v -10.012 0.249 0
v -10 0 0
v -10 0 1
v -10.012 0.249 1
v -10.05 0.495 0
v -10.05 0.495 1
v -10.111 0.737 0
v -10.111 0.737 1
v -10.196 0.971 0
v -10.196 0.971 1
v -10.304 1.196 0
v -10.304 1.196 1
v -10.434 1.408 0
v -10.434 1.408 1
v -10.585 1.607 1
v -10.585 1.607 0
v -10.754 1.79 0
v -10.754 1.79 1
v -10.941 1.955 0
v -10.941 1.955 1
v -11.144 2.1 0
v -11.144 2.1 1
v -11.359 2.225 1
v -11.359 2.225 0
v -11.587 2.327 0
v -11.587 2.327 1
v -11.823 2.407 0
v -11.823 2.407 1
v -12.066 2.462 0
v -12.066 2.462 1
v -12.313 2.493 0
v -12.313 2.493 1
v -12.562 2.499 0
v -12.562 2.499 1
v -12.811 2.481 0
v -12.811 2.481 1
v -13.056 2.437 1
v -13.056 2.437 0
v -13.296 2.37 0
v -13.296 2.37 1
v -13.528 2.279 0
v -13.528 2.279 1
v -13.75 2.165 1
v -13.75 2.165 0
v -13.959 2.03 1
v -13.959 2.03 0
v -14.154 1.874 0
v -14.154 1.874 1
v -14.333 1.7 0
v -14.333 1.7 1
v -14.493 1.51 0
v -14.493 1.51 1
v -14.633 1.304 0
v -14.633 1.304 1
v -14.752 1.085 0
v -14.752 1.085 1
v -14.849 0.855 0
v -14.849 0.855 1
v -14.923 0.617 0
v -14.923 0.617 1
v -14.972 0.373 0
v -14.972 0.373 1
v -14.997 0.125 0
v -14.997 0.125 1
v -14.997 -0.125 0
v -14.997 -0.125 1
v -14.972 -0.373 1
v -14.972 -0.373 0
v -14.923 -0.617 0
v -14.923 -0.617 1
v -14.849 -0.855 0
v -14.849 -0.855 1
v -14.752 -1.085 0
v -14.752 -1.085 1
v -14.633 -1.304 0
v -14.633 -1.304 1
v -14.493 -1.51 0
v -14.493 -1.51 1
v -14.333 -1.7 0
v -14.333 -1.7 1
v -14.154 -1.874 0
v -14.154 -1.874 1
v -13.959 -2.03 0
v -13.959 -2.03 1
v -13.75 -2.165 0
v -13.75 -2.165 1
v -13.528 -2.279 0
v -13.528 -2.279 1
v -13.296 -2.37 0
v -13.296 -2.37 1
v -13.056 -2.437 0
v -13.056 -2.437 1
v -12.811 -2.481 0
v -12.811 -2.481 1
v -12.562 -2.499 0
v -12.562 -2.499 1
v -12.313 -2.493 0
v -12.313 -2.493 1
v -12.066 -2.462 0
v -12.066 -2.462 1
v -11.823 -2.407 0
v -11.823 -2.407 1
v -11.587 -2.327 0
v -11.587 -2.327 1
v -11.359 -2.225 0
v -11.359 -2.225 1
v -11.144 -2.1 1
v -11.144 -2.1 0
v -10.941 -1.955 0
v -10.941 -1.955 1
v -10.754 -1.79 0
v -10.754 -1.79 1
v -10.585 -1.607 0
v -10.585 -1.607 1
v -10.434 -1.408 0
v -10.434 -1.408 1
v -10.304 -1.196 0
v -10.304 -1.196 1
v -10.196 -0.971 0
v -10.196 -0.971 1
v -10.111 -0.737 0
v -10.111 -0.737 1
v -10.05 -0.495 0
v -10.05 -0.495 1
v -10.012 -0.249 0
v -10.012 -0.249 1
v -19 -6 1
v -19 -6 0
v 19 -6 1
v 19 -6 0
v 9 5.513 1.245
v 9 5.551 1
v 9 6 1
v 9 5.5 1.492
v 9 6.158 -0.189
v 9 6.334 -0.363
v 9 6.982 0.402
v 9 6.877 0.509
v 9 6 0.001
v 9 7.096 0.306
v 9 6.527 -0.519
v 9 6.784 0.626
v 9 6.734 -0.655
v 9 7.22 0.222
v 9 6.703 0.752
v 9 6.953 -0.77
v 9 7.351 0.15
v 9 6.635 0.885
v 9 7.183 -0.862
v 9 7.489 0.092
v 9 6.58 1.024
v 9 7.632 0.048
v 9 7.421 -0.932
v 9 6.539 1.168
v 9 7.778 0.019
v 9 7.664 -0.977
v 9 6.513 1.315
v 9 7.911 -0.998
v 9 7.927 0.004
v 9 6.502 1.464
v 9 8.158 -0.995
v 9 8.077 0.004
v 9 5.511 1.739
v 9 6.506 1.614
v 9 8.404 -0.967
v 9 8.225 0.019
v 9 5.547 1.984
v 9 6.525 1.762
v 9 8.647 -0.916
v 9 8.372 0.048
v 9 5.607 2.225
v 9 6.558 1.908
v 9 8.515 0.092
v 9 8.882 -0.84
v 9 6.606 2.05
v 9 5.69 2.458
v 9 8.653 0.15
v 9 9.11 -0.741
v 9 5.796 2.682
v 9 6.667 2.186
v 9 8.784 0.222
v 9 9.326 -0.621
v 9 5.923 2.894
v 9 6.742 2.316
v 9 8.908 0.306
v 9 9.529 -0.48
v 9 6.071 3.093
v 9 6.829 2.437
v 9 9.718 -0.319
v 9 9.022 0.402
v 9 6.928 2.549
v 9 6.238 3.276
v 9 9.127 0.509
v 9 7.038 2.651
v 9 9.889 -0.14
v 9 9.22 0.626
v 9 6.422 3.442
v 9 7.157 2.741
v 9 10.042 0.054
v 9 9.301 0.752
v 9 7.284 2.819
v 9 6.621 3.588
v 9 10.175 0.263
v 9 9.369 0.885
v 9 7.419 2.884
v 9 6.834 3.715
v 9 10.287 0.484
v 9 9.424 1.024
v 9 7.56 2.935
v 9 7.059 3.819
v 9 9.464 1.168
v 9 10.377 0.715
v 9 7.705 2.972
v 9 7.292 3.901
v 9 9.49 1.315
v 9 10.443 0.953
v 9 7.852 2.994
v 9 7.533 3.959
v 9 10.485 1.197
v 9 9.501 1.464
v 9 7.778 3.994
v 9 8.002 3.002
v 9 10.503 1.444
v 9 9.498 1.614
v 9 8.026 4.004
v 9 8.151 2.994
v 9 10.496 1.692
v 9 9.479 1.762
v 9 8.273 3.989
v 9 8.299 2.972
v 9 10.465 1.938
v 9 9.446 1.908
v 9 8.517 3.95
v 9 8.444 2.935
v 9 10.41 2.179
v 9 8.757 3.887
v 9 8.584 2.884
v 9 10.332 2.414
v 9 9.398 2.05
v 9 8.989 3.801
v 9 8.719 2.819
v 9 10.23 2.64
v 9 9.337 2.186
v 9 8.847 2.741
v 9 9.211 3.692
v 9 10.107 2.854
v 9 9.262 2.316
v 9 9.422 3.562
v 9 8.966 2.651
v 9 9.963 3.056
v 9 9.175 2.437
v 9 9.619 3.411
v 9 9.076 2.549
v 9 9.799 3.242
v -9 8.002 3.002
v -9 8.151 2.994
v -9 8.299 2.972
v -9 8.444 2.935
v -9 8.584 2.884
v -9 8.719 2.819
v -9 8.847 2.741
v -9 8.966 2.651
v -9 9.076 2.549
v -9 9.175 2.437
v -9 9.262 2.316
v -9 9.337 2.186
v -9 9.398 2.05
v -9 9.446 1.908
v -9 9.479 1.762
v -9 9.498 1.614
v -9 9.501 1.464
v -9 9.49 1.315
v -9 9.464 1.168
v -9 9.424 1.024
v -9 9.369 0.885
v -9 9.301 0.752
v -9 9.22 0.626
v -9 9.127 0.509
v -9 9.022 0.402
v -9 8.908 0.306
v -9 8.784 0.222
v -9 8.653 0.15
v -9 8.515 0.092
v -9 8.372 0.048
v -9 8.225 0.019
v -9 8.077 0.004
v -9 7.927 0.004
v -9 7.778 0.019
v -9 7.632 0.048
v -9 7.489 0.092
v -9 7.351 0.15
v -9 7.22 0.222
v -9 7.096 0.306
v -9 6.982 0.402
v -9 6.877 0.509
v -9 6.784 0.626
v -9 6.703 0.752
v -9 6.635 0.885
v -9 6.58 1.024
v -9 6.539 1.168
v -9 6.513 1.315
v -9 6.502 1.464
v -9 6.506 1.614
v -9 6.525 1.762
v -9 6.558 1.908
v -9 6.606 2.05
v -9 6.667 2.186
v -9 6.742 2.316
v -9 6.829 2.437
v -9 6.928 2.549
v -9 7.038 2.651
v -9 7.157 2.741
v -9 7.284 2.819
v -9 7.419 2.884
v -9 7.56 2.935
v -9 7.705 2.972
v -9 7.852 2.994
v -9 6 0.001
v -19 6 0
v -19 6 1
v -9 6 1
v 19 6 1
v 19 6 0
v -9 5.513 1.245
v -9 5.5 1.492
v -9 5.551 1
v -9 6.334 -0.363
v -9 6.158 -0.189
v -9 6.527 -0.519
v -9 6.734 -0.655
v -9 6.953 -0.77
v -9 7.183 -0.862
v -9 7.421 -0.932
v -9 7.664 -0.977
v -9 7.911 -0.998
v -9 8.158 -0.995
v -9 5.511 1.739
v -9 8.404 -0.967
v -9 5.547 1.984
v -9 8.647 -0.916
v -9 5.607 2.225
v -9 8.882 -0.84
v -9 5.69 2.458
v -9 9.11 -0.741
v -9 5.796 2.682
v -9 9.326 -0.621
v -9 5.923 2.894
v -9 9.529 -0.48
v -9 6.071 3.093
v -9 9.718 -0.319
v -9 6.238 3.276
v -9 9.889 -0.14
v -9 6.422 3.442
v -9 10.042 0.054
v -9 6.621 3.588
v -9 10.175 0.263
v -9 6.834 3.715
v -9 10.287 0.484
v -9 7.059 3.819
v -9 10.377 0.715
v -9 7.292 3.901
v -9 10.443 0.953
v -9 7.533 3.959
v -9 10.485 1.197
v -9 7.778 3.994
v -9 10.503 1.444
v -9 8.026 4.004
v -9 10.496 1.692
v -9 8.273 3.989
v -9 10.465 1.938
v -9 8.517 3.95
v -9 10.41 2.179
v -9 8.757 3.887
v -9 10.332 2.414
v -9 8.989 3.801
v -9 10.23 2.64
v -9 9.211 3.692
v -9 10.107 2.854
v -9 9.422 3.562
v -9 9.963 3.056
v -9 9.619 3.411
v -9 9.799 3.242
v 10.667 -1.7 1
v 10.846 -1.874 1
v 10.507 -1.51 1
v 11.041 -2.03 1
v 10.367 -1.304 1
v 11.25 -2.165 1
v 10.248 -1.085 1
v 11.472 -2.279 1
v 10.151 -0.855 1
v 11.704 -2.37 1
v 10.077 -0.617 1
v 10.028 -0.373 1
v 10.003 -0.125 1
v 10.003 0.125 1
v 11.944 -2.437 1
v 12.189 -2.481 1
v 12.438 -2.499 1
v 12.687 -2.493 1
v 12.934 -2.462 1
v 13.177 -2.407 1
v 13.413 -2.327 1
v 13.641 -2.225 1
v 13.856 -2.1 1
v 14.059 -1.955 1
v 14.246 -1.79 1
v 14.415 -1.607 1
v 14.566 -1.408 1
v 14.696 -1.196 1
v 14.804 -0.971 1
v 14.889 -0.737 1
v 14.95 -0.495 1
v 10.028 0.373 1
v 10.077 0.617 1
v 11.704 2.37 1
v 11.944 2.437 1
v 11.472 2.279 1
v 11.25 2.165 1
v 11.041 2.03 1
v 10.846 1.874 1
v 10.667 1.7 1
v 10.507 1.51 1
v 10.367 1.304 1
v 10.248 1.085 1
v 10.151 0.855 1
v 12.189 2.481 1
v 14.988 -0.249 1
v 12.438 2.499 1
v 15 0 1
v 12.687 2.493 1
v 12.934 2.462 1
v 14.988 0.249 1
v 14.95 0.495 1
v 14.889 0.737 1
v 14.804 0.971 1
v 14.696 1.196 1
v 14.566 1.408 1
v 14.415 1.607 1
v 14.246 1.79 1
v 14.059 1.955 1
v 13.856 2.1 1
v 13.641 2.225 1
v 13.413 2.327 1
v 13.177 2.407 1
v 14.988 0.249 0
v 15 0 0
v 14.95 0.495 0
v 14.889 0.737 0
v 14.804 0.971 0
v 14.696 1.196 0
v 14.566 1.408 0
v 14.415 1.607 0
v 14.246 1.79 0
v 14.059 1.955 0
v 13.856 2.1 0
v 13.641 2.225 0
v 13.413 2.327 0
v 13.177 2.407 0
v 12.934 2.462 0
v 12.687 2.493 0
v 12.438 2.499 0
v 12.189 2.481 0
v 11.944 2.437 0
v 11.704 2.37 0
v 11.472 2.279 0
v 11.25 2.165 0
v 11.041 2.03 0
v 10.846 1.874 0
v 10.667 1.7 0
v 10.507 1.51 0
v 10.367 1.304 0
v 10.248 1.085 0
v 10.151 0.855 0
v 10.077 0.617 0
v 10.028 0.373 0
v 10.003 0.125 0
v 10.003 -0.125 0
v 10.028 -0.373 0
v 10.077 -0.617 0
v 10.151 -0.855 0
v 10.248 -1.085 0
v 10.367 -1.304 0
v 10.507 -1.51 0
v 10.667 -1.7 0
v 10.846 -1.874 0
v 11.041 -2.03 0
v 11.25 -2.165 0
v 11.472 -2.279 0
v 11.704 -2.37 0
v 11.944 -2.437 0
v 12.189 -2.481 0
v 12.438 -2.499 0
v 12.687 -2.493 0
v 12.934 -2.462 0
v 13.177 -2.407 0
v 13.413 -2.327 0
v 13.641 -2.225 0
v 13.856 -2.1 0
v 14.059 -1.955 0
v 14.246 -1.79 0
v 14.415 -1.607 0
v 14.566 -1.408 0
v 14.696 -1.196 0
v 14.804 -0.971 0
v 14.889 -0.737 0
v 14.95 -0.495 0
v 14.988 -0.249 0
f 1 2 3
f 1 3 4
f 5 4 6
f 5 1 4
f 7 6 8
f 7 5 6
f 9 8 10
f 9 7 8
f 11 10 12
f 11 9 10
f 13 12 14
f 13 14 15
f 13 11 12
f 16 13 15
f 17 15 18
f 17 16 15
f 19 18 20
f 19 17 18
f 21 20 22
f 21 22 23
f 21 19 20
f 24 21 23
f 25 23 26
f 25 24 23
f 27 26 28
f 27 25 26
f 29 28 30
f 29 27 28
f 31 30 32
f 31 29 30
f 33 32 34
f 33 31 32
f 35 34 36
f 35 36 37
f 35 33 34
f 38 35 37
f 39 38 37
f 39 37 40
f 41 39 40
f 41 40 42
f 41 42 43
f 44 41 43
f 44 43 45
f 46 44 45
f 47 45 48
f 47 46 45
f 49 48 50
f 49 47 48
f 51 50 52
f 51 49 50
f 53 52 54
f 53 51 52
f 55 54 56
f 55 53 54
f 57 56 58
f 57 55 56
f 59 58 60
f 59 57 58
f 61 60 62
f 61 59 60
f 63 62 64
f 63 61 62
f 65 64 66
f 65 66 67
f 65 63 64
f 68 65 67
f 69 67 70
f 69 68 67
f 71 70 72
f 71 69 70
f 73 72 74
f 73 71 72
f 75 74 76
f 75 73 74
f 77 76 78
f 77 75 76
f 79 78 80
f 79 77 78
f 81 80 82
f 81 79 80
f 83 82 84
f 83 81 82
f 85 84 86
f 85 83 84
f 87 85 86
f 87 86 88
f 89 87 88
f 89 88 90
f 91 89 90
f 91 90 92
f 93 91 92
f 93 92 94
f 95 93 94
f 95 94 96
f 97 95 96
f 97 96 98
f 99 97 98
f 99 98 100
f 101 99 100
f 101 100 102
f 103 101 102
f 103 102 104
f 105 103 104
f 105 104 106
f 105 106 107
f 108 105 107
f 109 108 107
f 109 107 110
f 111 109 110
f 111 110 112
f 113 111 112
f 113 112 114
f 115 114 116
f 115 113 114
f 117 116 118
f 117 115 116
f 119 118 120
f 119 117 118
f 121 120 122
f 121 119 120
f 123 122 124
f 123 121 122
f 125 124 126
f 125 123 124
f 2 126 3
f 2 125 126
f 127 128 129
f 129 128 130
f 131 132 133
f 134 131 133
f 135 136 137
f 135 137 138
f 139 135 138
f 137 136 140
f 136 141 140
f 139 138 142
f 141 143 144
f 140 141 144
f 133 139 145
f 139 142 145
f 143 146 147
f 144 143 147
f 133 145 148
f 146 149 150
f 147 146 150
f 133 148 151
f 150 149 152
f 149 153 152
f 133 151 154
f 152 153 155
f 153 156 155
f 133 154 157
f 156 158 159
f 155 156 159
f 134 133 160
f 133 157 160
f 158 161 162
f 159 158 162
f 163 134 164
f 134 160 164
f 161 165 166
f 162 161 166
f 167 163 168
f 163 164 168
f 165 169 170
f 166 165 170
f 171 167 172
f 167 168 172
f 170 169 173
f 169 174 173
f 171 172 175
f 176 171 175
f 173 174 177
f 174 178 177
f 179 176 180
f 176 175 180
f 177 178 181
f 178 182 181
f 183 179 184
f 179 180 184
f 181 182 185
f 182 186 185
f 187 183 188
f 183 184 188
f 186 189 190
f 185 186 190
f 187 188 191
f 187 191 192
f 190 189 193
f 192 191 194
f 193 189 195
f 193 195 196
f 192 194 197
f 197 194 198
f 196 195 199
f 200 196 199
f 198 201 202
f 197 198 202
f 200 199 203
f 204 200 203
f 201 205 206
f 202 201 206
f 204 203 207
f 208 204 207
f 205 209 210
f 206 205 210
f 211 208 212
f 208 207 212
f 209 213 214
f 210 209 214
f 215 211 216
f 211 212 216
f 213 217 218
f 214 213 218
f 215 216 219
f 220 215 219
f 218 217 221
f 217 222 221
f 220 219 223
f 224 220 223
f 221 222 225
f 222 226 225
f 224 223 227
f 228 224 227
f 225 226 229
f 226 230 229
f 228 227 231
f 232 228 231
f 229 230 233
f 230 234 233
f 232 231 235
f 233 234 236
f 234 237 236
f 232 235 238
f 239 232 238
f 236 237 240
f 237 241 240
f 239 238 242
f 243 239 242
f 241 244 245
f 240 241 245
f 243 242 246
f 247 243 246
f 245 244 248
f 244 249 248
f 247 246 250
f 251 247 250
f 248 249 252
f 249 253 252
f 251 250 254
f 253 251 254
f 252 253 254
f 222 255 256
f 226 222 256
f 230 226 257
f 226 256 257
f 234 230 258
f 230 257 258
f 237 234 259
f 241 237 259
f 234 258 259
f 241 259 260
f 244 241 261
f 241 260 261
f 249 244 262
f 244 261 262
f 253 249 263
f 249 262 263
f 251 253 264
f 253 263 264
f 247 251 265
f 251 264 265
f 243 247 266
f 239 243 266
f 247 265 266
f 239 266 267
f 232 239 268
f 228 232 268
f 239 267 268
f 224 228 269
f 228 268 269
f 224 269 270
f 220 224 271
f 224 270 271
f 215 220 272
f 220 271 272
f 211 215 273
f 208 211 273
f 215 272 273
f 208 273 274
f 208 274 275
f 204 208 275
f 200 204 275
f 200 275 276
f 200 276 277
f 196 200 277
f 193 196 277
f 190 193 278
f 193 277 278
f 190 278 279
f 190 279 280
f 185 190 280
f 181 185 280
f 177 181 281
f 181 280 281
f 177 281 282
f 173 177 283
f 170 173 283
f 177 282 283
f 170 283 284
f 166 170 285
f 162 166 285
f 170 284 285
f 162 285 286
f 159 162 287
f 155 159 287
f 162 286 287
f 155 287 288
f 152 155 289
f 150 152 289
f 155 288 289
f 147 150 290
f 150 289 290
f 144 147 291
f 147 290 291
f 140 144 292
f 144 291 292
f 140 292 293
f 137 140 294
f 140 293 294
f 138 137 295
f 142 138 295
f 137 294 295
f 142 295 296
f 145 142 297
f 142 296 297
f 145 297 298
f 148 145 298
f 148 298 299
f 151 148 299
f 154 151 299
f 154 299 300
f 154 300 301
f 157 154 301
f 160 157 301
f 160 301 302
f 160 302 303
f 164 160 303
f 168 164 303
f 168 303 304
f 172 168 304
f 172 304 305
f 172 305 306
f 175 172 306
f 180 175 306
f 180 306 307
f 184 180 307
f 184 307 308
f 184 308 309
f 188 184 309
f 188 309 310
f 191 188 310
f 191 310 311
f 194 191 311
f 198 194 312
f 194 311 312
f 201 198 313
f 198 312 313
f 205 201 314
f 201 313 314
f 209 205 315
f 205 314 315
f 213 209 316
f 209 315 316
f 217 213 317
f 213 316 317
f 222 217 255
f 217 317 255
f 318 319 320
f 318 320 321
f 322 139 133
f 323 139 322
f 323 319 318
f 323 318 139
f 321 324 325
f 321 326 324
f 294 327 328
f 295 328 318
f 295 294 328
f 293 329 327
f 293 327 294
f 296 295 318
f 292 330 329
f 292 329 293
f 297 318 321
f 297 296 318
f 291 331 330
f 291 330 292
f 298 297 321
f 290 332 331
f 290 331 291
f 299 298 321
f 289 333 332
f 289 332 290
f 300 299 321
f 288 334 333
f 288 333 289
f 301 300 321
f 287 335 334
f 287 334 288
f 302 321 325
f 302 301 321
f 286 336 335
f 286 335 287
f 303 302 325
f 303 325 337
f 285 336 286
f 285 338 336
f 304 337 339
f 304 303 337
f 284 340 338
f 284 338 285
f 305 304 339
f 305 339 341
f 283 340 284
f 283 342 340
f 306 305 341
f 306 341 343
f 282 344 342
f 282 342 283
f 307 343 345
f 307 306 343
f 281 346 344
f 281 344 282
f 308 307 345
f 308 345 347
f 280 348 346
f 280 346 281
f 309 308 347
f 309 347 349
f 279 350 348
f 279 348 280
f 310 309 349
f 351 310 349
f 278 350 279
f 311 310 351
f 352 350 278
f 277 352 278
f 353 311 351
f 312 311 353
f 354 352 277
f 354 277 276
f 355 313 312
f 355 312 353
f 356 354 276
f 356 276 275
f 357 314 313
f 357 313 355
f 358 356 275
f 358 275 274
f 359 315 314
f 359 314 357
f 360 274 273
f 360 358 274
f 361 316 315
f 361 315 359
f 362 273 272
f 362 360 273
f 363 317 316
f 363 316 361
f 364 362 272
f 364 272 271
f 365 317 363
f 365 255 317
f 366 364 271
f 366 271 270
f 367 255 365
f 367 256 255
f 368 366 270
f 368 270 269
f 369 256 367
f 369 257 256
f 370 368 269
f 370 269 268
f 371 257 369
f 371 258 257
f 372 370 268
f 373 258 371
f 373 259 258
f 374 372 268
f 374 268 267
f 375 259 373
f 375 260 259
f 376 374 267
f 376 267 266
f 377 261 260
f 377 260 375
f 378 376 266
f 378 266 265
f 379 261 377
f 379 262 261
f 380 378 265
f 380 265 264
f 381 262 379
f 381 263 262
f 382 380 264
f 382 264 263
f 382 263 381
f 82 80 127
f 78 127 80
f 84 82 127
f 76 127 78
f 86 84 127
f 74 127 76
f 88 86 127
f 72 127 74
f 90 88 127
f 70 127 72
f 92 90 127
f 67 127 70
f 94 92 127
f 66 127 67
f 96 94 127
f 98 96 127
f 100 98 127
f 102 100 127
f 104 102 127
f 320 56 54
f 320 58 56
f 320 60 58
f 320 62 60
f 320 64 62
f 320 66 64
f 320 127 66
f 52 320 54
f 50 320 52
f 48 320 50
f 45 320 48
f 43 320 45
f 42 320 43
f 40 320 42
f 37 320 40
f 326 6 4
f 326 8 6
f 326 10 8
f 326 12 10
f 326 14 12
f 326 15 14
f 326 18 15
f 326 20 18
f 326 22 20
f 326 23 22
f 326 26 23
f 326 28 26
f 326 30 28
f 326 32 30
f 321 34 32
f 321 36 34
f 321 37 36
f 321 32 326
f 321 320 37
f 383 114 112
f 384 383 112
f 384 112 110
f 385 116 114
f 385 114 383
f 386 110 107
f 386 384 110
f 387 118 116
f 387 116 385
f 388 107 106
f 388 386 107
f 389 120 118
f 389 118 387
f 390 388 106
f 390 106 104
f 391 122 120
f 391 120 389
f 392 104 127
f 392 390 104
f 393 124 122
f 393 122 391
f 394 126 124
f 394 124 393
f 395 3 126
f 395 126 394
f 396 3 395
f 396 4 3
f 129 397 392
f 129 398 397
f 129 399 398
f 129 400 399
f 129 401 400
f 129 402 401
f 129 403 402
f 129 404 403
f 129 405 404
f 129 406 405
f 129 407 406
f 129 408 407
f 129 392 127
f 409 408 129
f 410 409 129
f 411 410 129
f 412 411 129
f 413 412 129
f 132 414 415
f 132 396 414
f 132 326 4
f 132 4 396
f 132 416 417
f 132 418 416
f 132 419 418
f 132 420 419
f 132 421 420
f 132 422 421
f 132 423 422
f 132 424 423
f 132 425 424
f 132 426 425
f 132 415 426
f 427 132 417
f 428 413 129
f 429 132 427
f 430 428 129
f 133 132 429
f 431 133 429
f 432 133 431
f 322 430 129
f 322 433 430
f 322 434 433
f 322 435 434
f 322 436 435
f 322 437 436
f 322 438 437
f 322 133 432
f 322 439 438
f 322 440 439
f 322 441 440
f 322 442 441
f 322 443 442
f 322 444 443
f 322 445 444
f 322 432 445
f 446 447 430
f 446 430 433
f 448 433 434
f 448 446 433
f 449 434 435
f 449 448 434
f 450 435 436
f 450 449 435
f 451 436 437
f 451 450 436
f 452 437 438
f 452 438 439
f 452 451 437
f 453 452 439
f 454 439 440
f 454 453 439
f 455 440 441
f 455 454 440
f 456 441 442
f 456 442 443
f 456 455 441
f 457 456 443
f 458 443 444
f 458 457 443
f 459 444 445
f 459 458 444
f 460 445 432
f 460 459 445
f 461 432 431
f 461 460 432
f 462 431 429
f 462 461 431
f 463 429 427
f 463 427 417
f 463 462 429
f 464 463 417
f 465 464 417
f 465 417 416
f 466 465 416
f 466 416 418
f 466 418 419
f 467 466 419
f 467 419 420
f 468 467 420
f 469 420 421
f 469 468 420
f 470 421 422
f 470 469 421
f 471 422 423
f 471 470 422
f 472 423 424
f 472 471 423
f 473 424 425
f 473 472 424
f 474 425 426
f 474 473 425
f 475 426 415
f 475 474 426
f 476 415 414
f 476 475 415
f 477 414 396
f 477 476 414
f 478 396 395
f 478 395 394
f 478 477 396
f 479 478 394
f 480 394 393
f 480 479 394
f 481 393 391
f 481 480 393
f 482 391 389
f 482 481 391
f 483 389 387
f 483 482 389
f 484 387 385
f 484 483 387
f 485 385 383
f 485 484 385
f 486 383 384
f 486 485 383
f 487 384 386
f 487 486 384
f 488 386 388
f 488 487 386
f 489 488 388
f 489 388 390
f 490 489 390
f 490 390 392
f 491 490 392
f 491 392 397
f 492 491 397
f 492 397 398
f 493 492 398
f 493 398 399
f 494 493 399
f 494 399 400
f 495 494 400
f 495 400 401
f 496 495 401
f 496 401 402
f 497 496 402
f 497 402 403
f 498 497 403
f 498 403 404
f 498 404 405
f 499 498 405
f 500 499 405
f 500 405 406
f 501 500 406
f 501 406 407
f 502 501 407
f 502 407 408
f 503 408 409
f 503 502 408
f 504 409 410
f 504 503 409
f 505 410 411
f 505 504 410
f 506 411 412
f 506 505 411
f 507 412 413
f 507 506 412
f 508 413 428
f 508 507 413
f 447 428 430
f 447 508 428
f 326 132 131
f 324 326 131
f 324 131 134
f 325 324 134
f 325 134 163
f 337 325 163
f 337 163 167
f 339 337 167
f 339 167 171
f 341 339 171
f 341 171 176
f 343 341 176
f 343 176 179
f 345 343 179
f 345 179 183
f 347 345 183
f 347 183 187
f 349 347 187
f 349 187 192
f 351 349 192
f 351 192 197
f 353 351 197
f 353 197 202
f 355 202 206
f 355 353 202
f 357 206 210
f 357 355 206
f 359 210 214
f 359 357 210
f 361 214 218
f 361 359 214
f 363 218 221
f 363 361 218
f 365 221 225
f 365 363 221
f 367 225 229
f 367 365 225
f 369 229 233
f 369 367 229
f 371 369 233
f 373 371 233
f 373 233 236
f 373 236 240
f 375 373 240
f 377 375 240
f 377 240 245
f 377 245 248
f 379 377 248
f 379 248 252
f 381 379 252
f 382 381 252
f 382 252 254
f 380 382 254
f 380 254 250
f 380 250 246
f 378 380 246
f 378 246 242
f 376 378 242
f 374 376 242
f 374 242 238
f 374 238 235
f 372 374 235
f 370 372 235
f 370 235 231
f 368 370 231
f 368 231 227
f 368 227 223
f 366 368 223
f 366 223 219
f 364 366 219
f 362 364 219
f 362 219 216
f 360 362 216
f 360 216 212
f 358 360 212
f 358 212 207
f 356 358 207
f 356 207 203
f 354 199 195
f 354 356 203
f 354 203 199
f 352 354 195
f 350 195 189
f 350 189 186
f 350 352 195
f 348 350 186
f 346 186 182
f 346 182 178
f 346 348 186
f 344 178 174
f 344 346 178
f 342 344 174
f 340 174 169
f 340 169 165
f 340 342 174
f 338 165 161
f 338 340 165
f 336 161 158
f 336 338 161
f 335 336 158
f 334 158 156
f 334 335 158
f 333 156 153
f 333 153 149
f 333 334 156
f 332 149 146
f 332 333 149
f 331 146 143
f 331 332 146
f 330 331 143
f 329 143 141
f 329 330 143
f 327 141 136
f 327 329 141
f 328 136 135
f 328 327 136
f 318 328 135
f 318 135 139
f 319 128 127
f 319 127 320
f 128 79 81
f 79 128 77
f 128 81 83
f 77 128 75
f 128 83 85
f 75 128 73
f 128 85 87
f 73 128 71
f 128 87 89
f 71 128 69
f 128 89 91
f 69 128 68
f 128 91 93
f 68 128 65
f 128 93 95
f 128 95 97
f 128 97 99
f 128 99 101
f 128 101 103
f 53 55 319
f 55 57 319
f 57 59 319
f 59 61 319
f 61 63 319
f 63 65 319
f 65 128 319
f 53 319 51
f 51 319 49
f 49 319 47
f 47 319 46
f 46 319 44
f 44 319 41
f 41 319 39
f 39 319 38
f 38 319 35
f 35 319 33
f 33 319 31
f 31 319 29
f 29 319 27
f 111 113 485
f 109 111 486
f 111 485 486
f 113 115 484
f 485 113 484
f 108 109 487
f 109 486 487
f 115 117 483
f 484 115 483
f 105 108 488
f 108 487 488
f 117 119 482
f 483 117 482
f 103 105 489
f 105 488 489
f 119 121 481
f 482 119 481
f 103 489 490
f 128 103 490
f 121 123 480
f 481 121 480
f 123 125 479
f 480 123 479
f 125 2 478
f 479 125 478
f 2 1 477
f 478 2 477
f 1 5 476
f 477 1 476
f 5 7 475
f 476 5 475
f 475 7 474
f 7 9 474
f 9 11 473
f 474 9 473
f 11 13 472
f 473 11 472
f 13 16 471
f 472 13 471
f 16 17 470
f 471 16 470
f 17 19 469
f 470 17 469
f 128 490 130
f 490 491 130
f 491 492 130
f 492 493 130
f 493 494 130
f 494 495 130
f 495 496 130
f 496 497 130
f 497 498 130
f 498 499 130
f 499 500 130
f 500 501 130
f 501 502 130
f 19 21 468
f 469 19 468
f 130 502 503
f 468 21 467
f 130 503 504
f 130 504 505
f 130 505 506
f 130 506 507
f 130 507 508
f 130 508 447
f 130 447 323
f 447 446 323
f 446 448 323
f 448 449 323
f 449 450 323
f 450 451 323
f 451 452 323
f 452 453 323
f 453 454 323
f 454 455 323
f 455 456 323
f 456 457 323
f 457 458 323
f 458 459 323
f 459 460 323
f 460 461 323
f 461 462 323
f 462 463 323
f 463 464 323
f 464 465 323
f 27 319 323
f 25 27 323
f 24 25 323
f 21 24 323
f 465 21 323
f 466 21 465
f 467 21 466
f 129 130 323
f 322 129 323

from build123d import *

# Parameters (mm, degrees)
SKETCH_1_W      = 38
SKETCH_1_H      = 12
SKETCH_1_R      = 2.5
EXTRUDE_1_DEPTH = 1
SKETCH_3_R      = 2.50184692
SKETCH_3_R_2    = 1.5
EXTRUDE_2_DEPTH = 18


with BuildPart() as part:
    # 草图1 → 凸台-拉伸1 (new body)
    with BuildSketch(Plane.XY):
        Rectangle(SKETCH_1_W, SKETCH_1_H)
        with Locations((12.5, 0)):
            Circle(SKETCH_1_R, mode=Mode.SUBTRACT)
        with Locations((-12.5, 0)):
            Circle(SKETCH_1_R, mode=Mode.SUBTRACT)
    extrude(amount=EXTRUDE_1_DEPTH)

    # 草图3 → 凸台-拉伸2 (add)
    with BuildSketch(Plane.ZY.offset(9)):
        with Locations((1.50184692, 8.00184692)):
            Circle(SKETCH_3_R)
        with Locations((1.50184692, 8.00184692)):
            Circle(SKETCH_3_R_2, mode=Mode.SUBTRACT)
    extrude(amount=-EXTRUDE_2_DEPTH)


solid = part.part
